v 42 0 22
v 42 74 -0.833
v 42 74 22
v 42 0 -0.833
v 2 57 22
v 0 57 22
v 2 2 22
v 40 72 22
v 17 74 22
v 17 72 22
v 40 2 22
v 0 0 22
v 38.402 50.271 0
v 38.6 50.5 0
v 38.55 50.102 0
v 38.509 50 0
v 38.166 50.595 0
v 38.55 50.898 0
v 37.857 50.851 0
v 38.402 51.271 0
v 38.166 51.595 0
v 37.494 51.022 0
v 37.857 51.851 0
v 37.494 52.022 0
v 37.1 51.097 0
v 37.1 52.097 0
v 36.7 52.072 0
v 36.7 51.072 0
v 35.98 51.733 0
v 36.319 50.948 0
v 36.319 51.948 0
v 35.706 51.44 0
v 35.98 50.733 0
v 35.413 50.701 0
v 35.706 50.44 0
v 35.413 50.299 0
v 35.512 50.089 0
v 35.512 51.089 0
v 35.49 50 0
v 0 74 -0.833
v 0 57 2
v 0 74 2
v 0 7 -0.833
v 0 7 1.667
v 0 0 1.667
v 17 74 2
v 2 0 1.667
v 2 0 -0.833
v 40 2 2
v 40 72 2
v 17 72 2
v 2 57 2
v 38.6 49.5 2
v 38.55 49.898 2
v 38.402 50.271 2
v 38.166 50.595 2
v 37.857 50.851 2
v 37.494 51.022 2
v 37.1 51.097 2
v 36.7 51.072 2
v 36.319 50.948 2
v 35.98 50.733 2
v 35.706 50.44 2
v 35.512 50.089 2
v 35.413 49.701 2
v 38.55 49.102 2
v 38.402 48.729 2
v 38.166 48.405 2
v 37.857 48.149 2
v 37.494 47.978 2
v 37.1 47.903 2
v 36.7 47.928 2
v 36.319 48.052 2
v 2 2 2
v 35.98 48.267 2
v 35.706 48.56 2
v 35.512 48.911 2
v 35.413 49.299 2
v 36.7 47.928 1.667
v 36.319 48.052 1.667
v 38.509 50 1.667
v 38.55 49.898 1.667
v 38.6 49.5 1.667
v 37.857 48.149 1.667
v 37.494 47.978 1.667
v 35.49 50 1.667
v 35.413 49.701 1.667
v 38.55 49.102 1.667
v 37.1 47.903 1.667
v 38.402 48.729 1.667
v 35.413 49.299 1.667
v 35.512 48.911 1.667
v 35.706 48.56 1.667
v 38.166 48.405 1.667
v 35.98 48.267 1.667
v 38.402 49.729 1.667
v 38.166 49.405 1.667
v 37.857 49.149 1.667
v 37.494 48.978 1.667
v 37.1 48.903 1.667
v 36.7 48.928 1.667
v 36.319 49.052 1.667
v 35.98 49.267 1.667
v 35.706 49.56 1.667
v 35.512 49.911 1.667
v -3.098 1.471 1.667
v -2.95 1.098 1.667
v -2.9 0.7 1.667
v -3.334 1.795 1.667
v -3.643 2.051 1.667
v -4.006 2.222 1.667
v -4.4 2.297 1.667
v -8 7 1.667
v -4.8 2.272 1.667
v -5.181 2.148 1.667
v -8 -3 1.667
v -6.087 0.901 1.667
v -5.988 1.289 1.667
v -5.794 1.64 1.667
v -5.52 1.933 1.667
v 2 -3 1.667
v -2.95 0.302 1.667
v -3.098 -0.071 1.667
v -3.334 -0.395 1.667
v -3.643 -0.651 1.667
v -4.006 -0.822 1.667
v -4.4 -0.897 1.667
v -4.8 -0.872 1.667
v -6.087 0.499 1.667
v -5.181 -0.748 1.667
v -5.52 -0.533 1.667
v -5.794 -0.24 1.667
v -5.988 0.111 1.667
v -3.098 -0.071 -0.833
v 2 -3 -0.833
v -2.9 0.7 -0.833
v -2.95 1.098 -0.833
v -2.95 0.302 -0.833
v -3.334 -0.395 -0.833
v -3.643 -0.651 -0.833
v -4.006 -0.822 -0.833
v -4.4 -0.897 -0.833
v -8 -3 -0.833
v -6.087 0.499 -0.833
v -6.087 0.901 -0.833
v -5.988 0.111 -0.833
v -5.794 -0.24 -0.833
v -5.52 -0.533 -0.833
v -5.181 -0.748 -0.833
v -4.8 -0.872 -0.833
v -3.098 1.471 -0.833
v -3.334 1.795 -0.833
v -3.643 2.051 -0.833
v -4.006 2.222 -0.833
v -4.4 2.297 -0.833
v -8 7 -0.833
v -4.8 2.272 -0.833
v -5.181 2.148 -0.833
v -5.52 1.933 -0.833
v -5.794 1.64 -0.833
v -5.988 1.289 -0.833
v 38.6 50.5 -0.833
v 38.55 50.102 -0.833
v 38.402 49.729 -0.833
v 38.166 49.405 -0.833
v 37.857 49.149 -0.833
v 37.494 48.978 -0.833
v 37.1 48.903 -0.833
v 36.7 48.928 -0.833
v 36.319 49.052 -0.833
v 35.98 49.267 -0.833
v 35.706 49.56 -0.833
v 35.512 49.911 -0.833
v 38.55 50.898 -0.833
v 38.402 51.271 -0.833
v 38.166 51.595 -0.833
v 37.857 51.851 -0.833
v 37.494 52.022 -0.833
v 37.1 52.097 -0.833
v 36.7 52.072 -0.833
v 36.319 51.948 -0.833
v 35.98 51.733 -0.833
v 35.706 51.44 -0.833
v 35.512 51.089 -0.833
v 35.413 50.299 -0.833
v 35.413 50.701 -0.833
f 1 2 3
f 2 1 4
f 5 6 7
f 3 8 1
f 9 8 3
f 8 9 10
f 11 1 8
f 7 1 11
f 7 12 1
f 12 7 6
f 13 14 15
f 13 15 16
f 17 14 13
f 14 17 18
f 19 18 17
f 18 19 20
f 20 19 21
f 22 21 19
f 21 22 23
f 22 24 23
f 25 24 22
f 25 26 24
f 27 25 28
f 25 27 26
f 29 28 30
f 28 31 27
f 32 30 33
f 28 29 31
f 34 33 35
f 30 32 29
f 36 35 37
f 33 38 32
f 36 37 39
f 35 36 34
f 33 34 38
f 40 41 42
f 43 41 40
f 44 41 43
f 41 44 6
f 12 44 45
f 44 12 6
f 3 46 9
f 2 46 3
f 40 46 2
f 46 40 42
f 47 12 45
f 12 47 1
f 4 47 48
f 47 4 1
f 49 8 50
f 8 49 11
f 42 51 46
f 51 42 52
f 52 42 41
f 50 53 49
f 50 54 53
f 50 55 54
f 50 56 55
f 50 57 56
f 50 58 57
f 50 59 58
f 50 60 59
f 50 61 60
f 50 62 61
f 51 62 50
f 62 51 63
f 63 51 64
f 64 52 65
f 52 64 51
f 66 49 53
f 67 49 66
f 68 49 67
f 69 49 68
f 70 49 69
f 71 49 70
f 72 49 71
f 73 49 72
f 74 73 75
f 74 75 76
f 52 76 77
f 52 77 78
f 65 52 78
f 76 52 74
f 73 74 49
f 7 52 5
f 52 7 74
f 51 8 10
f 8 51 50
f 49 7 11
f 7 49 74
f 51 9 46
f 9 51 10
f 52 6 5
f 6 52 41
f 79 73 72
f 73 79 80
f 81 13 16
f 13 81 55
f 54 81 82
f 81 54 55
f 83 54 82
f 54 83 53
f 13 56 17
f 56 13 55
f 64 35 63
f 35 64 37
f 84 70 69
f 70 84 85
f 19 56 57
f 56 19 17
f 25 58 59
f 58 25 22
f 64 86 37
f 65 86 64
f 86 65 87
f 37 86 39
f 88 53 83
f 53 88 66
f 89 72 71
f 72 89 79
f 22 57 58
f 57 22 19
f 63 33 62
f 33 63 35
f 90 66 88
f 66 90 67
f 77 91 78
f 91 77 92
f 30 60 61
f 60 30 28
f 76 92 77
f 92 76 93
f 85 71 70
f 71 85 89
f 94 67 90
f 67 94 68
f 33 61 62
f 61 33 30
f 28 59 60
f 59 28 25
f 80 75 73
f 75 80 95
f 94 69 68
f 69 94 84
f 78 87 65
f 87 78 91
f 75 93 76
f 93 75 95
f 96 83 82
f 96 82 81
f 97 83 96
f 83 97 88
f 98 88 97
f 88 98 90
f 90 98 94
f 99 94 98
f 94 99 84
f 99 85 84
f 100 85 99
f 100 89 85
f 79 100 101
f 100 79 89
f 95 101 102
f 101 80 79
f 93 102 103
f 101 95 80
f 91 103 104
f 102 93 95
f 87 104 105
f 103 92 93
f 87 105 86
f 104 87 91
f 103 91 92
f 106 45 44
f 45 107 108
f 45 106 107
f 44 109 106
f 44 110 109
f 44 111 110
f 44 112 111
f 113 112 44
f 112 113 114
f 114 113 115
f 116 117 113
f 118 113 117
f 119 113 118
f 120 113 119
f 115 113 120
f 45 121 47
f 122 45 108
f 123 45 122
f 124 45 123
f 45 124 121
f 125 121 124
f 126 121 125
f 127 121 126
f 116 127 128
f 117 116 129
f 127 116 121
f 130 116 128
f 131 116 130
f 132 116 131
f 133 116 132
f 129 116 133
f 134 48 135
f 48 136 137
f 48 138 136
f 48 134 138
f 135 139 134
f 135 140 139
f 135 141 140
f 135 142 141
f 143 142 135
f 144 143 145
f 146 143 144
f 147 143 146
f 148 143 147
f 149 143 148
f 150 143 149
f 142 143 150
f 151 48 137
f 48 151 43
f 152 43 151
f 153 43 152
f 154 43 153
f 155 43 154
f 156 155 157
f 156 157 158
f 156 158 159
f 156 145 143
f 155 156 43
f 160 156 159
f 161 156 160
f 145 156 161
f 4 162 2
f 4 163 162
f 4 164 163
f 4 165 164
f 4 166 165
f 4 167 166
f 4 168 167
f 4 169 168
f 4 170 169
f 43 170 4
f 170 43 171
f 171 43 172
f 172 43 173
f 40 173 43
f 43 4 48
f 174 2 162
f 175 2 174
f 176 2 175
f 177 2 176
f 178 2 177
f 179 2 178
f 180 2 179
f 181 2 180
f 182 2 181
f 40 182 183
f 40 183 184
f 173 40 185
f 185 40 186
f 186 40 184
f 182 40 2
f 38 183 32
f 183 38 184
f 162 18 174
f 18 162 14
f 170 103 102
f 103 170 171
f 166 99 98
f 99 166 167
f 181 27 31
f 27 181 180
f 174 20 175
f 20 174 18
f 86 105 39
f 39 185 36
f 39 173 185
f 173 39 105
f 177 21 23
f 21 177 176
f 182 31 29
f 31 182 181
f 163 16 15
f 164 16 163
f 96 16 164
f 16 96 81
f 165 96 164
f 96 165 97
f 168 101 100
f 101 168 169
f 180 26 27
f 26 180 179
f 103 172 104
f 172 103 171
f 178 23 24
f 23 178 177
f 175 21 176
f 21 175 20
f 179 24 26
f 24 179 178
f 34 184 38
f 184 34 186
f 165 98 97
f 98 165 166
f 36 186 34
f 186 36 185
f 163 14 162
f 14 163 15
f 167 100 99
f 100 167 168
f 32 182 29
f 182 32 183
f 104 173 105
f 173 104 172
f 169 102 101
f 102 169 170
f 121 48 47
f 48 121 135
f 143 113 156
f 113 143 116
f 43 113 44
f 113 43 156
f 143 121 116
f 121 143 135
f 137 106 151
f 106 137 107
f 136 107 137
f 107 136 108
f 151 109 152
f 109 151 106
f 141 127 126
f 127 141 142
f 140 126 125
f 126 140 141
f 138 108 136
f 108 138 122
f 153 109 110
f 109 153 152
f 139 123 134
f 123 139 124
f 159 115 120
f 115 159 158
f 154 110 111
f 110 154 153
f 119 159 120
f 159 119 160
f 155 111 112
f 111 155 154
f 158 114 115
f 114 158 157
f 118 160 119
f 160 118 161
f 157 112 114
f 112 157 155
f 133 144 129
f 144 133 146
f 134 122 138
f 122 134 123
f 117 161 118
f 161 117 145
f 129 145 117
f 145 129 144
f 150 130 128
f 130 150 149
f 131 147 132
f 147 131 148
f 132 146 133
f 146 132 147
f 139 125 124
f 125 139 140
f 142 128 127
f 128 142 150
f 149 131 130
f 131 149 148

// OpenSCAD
espesor_pared = 2;

largo_interno = 70;
ancho_interno = 38;
alto_interno = 20;

alto_externo = alto_interno + espesor_pared;
largo_externo = largo_interno + 2 * espesor_pared;
ancho_externo = ancho_interno + 2 * espesor_pared;

ancho_agujero = 15;
largo_agujero = 15;
alto_cola = 15;

ancho_llave = 16;
desp_ancho_llave = 13;

ancho_base = 42;
alto_base = 2.5;
delta_ancho = 0;

largo_base_interno = 42;

tornillo = 8;

radio = 94.25;
antigolpe = 8;

abase_aux = 9;
lbase_aux = 9;
lbase_delta = 8;
abase_delta = 3;

difference() {
  cube([ancho_externo,largo_externo,alto_externo]);
  translate([espesor_pared,espesor_pared,espesor_pared])
    cube([ancho_interno,largo_interno,alto_interno+.01]);
  translate([-.1,largo_externo-largo_agujero-espesor_pared,espesor_pared])
    cube([ancho_agujero+espesor_pared+.1,largo_agujero+espesor_pared+.01,alto_interno+.1]);
  translate([37, 49.5, -5])
	 cylinder(h = 10, r = 1.6, $fn=25, center = false);
}

difference() {
	translate([-((ancho_base-ancho_externo)/2 - delta_ancho),0,-alto_base/3])
   		cube([ancho_base, largo_externo, alto_base]);
	translate([37, 50.5, -5])
		cylinder(h = 10, r = 1.6, $fn=25, center = false);
}

difference(){
	translate([-lbase_delta, -abase_delta, -alto_base/3])
		cube([10, 10, alto_base]);
	translate([-4.5, 0.7, -alto_base/3])
		cylinder(h = alto_base*2, r = 1.6, $fn=25, center = false);
}

*difference(){
  translate([ancho_externo-espesor_pared,0,-alto_cola-alto_base])
    cube([espesor_pared,largo_externo,alto_cola+alto_base+.1]);

  translate([ancho_externo-espesor_pared-.01,desp_ancho_llave,-alto_cola-alto_base-.01])
    cube([espesor_pared+.02,ancho_llave+.01,alto_base]);
}
